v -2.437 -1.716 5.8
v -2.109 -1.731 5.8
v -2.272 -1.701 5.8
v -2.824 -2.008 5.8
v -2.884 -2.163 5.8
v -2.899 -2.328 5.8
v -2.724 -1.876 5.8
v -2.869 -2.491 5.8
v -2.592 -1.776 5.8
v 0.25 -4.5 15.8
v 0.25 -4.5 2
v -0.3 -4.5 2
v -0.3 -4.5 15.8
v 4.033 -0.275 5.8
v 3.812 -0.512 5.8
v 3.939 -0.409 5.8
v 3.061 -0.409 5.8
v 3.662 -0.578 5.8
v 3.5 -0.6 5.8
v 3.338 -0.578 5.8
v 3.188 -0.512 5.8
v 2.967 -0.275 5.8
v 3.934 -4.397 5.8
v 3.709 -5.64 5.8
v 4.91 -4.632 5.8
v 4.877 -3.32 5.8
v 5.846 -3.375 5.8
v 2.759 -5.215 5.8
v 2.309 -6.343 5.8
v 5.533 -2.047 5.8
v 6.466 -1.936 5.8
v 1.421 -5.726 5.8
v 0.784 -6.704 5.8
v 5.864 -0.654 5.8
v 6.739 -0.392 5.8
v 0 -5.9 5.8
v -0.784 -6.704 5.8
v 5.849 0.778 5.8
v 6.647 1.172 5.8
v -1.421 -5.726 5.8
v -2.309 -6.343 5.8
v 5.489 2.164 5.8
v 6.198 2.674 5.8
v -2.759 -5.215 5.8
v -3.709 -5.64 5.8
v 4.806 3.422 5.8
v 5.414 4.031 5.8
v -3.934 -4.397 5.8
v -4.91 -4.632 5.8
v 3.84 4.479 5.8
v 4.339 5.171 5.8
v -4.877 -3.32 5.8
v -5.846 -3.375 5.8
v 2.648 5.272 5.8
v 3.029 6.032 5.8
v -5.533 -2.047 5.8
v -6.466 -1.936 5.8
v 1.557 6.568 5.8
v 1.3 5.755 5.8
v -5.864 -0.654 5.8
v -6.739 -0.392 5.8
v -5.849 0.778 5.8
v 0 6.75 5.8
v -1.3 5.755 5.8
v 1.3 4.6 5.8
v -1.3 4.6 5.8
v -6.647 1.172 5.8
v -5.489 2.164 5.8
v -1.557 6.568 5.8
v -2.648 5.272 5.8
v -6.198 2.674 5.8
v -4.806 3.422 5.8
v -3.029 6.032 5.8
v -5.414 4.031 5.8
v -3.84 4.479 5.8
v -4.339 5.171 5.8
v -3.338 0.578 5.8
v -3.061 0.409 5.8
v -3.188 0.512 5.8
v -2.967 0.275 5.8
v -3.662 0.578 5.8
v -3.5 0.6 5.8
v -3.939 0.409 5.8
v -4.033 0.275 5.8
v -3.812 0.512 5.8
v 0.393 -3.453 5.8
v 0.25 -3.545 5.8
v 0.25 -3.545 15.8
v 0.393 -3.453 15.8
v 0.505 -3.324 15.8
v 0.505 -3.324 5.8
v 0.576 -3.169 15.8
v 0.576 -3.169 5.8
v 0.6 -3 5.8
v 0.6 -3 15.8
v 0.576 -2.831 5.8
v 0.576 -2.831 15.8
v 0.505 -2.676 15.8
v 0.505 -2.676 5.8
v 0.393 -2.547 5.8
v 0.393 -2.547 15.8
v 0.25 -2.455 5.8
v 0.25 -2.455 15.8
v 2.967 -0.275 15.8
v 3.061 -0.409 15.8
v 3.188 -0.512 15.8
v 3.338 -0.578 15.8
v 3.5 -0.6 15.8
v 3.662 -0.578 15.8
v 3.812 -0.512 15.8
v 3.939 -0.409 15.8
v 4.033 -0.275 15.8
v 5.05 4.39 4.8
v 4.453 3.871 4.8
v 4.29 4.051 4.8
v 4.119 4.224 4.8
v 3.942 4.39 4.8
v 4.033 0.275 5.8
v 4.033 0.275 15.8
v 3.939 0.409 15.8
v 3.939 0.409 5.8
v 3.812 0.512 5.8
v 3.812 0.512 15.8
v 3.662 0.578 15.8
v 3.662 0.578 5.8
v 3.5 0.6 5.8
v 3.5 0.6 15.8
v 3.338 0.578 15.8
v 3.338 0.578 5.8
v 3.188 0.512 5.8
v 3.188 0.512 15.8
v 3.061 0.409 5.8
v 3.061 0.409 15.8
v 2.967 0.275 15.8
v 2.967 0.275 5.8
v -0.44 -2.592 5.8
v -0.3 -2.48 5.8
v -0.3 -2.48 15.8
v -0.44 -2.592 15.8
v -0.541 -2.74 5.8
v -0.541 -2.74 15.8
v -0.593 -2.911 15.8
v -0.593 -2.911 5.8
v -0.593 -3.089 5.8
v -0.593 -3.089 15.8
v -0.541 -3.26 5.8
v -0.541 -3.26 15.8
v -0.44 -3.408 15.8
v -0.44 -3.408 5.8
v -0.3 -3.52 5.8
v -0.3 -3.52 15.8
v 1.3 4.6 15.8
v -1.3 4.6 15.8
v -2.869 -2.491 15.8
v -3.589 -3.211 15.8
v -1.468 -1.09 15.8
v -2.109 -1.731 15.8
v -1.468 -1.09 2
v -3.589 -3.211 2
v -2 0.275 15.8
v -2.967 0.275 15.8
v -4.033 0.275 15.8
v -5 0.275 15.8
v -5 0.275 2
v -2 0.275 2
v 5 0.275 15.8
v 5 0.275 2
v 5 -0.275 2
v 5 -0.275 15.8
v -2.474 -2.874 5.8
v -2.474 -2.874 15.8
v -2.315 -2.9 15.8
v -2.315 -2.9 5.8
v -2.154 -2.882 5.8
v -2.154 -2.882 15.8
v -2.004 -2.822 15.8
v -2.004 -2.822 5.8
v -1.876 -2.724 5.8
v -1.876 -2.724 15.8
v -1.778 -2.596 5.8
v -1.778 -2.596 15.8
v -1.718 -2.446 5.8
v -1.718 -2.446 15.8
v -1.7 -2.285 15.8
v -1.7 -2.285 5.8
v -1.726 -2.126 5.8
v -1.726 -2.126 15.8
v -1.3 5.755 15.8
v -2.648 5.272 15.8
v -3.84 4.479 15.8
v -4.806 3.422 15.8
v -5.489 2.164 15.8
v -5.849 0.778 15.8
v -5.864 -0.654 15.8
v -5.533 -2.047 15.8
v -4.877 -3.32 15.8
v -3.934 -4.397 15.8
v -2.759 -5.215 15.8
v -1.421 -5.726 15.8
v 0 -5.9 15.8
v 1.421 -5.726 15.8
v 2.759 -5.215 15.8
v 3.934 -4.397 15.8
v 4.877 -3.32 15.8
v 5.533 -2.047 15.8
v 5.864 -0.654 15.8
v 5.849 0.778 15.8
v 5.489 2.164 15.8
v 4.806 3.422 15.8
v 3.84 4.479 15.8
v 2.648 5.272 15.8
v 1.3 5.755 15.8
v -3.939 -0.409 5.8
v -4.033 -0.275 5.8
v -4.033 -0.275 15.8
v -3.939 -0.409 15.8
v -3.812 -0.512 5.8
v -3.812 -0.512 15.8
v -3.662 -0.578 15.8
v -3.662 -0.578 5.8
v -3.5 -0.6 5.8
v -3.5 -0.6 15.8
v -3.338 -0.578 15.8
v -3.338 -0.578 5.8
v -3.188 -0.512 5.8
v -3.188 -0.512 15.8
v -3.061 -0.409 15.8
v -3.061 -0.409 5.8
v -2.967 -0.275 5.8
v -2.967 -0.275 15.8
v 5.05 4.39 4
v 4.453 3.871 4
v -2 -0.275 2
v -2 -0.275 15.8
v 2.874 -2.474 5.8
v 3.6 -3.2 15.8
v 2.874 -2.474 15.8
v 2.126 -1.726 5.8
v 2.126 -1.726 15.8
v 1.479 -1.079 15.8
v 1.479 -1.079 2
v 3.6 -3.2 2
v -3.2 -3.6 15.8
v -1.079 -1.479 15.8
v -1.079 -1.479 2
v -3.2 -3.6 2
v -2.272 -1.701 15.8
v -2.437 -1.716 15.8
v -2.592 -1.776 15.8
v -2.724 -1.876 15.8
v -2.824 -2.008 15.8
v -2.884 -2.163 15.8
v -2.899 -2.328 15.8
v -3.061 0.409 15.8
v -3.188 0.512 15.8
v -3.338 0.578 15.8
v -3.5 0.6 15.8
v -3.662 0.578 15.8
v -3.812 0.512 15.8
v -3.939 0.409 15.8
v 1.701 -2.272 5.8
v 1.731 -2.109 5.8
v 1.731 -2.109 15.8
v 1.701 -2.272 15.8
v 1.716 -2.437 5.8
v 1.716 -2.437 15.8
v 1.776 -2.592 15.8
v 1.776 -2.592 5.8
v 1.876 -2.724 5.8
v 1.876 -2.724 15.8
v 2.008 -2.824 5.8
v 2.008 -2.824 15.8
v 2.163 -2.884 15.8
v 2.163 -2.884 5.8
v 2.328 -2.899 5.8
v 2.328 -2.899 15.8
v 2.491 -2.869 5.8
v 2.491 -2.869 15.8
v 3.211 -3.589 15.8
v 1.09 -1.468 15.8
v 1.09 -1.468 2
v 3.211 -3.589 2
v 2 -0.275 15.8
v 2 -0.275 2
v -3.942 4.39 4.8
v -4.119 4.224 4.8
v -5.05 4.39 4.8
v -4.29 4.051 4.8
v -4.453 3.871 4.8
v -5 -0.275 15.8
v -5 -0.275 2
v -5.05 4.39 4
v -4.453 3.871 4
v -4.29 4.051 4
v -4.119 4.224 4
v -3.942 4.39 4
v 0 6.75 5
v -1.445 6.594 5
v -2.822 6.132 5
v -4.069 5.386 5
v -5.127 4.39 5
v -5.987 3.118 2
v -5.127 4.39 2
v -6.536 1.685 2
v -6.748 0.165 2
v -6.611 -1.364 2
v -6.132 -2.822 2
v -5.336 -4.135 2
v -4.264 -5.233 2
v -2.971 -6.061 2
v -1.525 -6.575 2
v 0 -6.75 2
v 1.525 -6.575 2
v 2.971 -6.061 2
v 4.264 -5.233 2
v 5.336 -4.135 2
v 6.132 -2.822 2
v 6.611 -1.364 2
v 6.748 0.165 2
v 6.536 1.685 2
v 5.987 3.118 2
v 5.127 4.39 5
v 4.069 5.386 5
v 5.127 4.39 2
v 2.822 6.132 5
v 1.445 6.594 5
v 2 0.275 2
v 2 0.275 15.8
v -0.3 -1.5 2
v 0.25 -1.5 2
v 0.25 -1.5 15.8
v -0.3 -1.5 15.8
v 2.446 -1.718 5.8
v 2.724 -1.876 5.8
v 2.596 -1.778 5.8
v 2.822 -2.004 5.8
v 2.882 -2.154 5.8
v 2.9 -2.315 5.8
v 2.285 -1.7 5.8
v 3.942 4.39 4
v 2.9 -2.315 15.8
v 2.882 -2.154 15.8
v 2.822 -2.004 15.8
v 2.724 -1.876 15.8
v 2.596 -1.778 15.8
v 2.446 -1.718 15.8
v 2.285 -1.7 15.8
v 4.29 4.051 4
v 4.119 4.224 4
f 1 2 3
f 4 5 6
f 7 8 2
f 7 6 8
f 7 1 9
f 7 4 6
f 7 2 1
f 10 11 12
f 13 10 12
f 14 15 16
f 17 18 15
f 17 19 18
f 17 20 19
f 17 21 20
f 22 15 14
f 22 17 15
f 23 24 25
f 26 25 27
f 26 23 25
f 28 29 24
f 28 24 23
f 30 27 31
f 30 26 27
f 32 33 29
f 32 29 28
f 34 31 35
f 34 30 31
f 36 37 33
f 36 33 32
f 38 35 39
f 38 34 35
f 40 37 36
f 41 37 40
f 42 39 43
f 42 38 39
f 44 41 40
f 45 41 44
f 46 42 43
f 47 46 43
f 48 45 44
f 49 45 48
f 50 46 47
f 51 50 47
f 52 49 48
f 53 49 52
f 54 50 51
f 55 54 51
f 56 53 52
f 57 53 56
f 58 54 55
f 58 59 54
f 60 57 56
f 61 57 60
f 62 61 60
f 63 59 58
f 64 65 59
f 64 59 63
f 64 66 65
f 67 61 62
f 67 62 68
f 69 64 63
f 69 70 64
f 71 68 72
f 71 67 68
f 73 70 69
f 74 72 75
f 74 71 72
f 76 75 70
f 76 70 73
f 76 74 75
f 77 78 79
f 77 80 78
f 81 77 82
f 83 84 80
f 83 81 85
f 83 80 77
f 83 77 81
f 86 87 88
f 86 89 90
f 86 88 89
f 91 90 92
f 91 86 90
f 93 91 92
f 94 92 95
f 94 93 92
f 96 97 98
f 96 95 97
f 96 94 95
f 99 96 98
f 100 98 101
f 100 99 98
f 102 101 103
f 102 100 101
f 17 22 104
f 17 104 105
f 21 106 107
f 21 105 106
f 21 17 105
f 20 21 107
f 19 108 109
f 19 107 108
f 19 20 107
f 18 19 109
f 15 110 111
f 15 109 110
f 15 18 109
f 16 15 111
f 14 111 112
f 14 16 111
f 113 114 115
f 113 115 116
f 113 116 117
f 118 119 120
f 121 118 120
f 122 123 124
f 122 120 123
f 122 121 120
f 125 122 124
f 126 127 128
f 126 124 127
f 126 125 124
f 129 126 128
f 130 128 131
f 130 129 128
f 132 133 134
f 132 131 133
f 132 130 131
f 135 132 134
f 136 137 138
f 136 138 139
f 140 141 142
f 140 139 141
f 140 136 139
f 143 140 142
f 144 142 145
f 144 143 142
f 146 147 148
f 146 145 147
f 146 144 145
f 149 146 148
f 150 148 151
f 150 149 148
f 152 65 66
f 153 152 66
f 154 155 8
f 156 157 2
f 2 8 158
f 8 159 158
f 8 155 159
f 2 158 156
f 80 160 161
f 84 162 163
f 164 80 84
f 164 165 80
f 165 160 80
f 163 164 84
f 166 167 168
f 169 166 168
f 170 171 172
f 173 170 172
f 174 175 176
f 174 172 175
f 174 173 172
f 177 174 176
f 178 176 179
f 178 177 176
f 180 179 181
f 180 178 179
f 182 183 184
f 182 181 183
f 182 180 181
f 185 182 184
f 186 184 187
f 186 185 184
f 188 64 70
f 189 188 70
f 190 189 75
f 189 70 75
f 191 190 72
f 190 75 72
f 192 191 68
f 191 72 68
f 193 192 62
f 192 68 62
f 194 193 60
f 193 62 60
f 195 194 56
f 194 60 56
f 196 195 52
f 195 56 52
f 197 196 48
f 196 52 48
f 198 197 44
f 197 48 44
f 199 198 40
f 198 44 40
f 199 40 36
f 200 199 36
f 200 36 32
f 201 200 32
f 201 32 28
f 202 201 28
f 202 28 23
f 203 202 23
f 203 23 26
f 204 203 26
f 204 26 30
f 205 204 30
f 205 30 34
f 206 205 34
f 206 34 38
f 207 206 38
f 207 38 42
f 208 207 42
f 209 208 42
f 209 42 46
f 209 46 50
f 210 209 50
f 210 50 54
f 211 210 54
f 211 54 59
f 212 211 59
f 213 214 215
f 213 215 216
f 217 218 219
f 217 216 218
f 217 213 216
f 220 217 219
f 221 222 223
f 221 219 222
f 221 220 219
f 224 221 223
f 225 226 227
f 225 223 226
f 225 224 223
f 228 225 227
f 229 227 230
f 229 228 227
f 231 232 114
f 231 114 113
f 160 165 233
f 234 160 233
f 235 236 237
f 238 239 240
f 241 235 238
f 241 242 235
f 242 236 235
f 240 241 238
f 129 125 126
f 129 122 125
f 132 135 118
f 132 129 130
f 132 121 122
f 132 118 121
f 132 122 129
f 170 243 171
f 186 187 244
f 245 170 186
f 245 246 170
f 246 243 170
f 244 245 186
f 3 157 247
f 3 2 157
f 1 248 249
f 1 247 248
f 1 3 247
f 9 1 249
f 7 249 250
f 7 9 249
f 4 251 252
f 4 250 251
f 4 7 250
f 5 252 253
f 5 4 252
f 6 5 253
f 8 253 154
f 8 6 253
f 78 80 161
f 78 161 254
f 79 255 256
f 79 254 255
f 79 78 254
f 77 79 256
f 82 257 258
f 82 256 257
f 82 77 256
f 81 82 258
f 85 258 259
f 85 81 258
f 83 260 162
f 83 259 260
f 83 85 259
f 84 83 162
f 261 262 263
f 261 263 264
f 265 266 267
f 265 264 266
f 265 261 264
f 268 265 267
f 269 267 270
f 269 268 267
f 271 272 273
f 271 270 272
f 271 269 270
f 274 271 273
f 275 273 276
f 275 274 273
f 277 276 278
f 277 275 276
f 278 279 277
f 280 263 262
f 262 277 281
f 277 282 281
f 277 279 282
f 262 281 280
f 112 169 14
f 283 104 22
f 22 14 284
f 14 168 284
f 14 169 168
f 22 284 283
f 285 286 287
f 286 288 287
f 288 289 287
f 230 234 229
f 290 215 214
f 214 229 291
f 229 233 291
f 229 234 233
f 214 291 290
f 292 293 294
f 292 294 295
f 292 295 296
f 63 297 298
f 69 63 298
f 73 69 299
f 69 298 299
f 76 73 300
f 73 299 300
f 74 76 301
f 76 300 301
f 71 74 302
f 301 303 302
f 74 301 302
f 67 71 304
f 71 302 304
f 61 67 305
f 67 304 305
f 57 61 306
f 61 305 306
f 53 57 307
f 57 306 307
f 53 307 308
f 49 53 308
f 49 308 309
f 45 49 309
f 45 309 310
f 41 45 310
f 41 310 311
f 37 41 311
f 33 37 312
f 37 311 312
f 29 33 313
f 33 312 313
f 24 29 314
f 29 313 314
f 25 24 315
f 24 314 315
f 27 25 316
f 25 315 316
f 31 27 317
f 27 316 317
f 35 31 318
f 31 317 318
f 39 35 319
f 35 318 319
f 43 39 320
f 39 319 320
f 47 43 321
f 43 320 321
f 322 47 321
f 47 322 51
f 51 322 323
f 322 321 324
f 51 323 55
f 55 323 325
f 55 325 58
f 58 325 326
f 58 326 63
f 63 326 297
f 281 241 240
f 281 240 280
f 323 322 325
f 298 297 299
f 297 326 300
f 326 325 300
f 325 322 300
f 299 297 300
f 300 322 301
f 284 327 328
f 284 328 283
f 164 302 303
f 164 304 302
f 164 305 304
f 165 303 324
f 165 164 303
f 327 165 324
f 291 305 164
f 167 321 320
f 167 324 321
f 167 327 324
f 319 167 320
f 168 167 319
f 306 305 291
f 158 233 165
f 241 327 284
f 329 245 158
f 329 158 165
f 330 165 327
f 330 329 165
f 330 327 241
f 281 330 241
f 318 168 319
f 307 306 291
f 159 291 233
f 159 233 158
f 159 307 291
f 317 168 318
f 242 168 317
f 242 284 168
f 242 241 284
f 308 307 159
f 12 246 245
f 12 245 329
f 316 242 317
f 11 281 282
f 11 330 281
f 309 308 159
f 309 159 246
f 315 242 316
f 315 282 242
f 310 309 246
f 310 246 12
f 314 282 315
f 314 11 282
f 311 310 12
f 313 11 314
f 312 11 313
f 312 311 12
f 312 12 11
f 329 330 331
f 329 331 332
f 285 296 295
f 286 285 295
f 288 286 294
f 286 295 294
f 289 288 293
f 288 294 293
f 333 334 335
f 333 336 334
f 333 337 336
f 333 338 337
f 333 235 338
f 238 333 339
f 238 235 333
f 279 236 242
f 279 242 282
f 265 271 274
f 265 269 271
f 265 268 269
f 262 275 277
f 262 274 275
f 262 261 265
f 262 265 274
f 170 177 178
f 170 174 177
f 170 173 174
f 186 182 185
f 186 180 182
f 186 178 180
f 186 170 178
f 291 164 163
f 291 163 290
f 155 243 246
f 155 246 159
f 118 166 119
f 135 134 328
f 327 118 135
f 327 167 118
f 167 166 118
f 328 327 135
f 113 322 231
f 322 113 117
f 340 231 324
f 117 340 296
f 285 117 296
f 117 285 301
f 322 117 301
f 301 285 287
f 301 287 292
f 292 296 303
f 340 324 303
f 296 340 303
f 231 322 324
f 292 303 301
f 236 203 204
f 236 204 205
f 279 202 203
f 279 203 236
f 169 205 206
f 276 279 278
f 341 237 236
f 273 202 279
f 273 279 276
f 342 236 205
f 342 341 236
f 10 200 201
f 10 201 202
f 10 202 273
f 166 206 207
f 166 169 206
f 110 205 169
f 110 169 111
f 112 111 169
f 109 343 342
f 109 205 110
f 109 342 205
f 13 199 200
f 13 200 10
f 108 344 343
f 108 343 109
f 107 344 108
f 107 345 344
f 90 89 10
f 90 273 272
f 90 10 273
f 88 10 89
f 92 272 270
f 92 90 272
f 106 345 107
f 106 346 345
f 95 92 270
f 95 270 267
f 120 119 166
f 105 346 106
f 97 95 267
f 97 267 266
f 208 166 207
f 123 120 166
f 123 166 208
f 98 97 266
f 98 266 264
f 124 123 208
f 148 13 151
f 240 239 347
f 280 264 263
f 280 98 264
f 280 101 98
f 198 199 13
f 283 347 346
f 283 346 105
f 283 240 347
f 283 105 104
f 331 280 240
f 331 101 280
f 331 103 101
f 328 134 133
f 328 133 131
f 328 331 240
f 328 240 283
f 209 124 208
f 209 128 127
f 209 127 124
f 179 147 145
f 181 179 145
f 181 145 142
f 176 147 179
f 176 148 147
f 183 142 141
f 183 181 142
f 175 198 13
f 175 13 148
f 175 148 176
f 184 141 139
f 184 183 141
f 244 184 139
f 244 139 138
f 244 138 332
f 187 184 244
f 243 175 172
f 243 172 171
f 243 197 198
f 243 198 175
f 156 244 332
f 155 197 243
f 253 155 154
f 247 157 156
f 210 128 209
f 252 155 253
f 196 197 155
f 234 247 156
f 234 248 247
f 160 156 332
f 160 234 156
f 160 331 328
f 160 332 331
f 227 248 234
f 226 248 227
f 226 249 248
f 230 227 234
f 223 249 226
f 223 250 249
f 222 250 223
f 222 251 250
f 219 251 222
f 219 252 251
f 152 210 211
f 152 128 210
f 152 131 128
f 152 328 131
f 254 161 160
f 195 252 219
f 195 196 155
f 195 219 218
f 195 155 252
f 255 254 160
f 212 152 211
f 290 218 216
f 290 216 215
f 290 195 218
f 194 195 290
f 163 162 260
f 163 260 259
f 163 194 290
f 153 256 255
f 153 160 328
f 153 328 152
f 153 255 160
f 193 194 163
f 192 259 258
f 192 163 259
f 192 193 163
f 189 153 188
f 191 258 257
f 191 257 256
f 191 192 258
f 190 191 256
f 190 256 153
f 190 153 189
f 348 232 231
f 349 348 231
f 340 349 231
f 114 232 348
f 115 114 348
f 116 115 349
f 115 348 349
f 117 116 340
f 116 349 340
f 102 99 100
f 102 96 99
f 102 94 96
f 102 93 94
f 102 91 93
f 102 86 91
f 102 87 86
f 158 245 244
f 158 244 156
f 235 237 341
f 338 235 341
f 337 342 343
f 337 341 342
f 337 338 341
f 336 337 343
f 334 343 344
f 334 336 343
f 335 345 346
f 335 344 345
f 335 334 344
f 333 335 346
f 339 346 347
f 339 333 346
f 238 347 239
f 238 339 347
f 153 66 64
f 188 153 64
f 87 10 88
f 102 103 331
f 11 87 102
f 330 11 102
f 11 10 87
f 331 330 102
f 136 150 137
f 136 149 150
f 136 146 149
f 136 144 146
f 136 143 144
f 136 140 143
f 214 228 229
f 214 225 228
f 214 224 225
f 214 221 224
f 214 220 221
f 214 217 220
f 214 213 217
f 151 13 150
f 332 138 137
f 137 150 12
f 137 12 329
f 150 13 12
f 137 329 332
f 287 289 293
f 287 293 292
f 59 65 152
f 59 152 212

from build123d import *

# Parameters (mm, degrees)
CYLINDER018_R           = 5.9
CYLINDER018_DEPTH       = 13.8
CYLINDER020_R           = 0.6
CYLINDER020_DEPTH       = 16
CYLINDER021_R           = 0.6
CYLINDER021_DEPTH       = 16
BOX008_W                = 1.3
BOX008_H                = 2.6
BOX008_DEPTH            = 11
CYLINDER022_R           = 0.6
CYLINDER022_DEPTH       = 16
CYLINDER023_R           = 0.6
CYLINDER023_DEPTH       = 16
CYLINDER024_R           = 0.6
CYLINDER024_DEPTH       = 16
CYLINDER026_W           = 6.75
CYLINDER026_H           = 3
CYLINDER026_ANGLE       = 262
BOX010_W                = 4.4
BOX010_H                = 10.19
BOX010_DEPTH            = 2
CYLINDER027_R           = 6.75
CYLINDER027_DEPTH       = 1
BOX011_W                = 3
BOX011_H                = 0.55
BOX011_DEPTH            = 14
BOX012_W                = 3
BOX012_H                = 0.55
BOX012_DEPTH            = 14
BOX013_W                = 3
BOX013_H                = 0.55
BOX013_DEPTH            = 14
BOX014_W                = 3
BOX014_H                = 0.55
BOX014_DEPTH            = 14
BOX015_W                = 3
BOX015_H                = 0.55
BOX015_DEPTH            = 14
BOX007_W                = 5
BOX007_H                = 11
BOX007_DEPTH            = 3
BODY018_PLACEMENT_ANGLE = 90


with BuildPart() as part:
    # Cylinder018 → Cylinder018 (join)
    with BuildSketch(Plane.XY.offset(2)):
        Circle(CYLINDER018_R)
    extrude(amount=CYLINDER018_DEPTH)

    # Cylinder020 → Cylinder020 (cut)
    with BuildSketch(Plane(origin=(0, 3.5, 0), x_dir=(1, 0, 0), z_dir=(0, 0, 1))):
        Circle(CYLINDER020_R)
    extrude(amount=CYLINDER020_DEPTH, mode=Mode.SUBTRACT)

    # Cylinder021 → Cylinder021 (cut)
    with BuildSketch(Plane(origin=(0, -3.5, 0), x_dir=(1, 0, 0), z_dir=(0, 0, 1))):
        Circle(CYLINDER021_R)
    extrude(amount=CYLINDER021_DEPTH, mode=Mode.SUBTRACT)

    # Box008 → Box008 (cut)
    with BuildSketch(Plane(origin=(4.6, -1.3, 5), x_dir=(1, 0, 0), z_dir=(0, 0, 1))):
        with Locations((0.65, 1.3)):
            Rectangle(BOX008_W, BOX008_H)
    extrude(amount=BOX008_DEPTH, mode=Mode.SUBTRACT)

    # Cylinder022 → Cylinder022 (cut)
    with BuildSketch(Plane(origin=(-3, 0, 0), x_dir=(1, 0, 0), z_dir=(0, 0, 1))):
        Circle(CYLINDER022_R)
    extrude(amount=CYLINDER022_DEPTH, mode=Mode.SUBTRACT)

    # Cylinder023 → Cylinder023 (cut)
    with BuildSketch(Plane(origin=(-2.3, -2.3, 0), x_dir=(1, 0, 0), z_dir=(0, 0, 1))):
        Circle(CYLINDER023_R)
    extrude(amount=CYLINDER023_DEPTH, mode=Mode.SUBTRACT)

    # Cylinder024 → Cylinder024 (cut)
    with BuildSketch(Plane(origin=(-2.3, 2.3, 0), x_dir=(1, 0, 0), z_dir=(0, 0, 1))):
        Circle(CYLINDER024_R)
    extrude(amount=CYLINDER024_DEPTH, mode=Mode.SUBTRACT)

    # Cylinder026 → Cylinder026 (revolve)
    with BuildSketch(Plane(origin=(0, 0, 2), x_dir=(0.656059, 0.75471, 0), z_dir=(0.75471, -0.656059, 0))):
        with Locations((3.375, 1.5)):
            Rectangle(CYLINDER026_W, CYLINDER026_H)
    revolve(axis=Axis((0, 0, 2), (0, 0, 1)), revolution_arc=CYLINDER026_ANGLE)

    # Box010 → Box010 (join)
    with BuildSketch(Plane(origin=(0.03, -5.095, 2), x_dir=(1, 0, 0), z_dir=(0, 0, 1))):
        with Locations((2.2, 5.095)):
            Rectangle(BOX010_W, BOX010_H)
    extrude(amount=BOX010_DEPTH)

    # Cylinder027 → Cylinder027 (join)
    with BuildSketch(Plane.XY.offset(4.8)):
        Circle(CYLINDER027_R)
    extrude(amount=CYLINDER027_DEPTH)

    # Box011 → Box011 (cut)
    with BuildSketch(Plane(origin=(0.275, -5, 2), x_dir=(0, 1, 0), z_dir=(0, 0, 1))):
        with Locations((1.5, 0.275)):
            Rectangle(BOX011_W, BOX011_H)
    extrude(amount=BOX011_DEPTH, mode=Mode.SUBTRACT)

    # Box012 → Box012 (cut)
    with BuildSketch(Plane(origin=(-3.6, 3.2, 2), x_dir=(0.707107, -0.707107, 0), z_dir=(0, 0, 1))):
        with Locations((1.5, 0.275)):
            Rectangle(BOX012_W, BOX012_H)
    extrude(amount=BOX012_DEPTH, mode=Mode.SUBTRACT)

    # Box013 → Box013 (cut)
    with BuildSketch(Plane(origin=(-4.5, -0.25, 2), x_dir=(1, 0, 0), z_dir=(0, 0, 1))):
        with Locations((1.5, 0.275)):
            Rectangle(BOX013_W, BOX013_H)
    extrude(amount=BOX013_DEPTH, mode=Mode.SUBTRACT)

    # Box014 → Box014 (cut)
    with BuildSketch(Plane(origin=(-3.2, -3.6, 2), x_dir=(0.707107, 0.707107, 0), z_dir=(0, 0, 1))):
        with Locations((1.5, 0.275)):
            Rectangle(BOX014_W, BOX014_H)
    extrude(amount=BOX014_DEPTH, mode=Mode.SUBTRACT)

    # Box015 → Box015 (cut)
    with BuildSketch(Plane(origin=(0.275, 2, 2), x_dir=(0, 1, 0), z_dir=(0, 0, 1))):
        with Locations((1.5, 0.275)):
            Rectangle(BOX015_W, BOX015_H)
    extrude(amount=BOX015_DEPTH, mode=Mode.SUBTRACT)

    # Box007 → Box007 (cut)
    with BuildSketch(Plane(origin=(4.39, -5.5, 2), x_dir=(1, 0, 0), z_dir=(0, 0, 1))):
        with Locations((2.5, 5.5)):
            Rectangle(BOX007_W, BOX007_H)
    extrude(amount=BOX007_DEPTH, mode=Mode.SUBTRACT)


with BuildPart() as part_1:
    # Body018 placement: moved
    add(part.part.rotate(Axis((0, 0, 0), (0, 0, 1)), BODY018_PLACEMENT_ANGLE))


solid = part_1.part
